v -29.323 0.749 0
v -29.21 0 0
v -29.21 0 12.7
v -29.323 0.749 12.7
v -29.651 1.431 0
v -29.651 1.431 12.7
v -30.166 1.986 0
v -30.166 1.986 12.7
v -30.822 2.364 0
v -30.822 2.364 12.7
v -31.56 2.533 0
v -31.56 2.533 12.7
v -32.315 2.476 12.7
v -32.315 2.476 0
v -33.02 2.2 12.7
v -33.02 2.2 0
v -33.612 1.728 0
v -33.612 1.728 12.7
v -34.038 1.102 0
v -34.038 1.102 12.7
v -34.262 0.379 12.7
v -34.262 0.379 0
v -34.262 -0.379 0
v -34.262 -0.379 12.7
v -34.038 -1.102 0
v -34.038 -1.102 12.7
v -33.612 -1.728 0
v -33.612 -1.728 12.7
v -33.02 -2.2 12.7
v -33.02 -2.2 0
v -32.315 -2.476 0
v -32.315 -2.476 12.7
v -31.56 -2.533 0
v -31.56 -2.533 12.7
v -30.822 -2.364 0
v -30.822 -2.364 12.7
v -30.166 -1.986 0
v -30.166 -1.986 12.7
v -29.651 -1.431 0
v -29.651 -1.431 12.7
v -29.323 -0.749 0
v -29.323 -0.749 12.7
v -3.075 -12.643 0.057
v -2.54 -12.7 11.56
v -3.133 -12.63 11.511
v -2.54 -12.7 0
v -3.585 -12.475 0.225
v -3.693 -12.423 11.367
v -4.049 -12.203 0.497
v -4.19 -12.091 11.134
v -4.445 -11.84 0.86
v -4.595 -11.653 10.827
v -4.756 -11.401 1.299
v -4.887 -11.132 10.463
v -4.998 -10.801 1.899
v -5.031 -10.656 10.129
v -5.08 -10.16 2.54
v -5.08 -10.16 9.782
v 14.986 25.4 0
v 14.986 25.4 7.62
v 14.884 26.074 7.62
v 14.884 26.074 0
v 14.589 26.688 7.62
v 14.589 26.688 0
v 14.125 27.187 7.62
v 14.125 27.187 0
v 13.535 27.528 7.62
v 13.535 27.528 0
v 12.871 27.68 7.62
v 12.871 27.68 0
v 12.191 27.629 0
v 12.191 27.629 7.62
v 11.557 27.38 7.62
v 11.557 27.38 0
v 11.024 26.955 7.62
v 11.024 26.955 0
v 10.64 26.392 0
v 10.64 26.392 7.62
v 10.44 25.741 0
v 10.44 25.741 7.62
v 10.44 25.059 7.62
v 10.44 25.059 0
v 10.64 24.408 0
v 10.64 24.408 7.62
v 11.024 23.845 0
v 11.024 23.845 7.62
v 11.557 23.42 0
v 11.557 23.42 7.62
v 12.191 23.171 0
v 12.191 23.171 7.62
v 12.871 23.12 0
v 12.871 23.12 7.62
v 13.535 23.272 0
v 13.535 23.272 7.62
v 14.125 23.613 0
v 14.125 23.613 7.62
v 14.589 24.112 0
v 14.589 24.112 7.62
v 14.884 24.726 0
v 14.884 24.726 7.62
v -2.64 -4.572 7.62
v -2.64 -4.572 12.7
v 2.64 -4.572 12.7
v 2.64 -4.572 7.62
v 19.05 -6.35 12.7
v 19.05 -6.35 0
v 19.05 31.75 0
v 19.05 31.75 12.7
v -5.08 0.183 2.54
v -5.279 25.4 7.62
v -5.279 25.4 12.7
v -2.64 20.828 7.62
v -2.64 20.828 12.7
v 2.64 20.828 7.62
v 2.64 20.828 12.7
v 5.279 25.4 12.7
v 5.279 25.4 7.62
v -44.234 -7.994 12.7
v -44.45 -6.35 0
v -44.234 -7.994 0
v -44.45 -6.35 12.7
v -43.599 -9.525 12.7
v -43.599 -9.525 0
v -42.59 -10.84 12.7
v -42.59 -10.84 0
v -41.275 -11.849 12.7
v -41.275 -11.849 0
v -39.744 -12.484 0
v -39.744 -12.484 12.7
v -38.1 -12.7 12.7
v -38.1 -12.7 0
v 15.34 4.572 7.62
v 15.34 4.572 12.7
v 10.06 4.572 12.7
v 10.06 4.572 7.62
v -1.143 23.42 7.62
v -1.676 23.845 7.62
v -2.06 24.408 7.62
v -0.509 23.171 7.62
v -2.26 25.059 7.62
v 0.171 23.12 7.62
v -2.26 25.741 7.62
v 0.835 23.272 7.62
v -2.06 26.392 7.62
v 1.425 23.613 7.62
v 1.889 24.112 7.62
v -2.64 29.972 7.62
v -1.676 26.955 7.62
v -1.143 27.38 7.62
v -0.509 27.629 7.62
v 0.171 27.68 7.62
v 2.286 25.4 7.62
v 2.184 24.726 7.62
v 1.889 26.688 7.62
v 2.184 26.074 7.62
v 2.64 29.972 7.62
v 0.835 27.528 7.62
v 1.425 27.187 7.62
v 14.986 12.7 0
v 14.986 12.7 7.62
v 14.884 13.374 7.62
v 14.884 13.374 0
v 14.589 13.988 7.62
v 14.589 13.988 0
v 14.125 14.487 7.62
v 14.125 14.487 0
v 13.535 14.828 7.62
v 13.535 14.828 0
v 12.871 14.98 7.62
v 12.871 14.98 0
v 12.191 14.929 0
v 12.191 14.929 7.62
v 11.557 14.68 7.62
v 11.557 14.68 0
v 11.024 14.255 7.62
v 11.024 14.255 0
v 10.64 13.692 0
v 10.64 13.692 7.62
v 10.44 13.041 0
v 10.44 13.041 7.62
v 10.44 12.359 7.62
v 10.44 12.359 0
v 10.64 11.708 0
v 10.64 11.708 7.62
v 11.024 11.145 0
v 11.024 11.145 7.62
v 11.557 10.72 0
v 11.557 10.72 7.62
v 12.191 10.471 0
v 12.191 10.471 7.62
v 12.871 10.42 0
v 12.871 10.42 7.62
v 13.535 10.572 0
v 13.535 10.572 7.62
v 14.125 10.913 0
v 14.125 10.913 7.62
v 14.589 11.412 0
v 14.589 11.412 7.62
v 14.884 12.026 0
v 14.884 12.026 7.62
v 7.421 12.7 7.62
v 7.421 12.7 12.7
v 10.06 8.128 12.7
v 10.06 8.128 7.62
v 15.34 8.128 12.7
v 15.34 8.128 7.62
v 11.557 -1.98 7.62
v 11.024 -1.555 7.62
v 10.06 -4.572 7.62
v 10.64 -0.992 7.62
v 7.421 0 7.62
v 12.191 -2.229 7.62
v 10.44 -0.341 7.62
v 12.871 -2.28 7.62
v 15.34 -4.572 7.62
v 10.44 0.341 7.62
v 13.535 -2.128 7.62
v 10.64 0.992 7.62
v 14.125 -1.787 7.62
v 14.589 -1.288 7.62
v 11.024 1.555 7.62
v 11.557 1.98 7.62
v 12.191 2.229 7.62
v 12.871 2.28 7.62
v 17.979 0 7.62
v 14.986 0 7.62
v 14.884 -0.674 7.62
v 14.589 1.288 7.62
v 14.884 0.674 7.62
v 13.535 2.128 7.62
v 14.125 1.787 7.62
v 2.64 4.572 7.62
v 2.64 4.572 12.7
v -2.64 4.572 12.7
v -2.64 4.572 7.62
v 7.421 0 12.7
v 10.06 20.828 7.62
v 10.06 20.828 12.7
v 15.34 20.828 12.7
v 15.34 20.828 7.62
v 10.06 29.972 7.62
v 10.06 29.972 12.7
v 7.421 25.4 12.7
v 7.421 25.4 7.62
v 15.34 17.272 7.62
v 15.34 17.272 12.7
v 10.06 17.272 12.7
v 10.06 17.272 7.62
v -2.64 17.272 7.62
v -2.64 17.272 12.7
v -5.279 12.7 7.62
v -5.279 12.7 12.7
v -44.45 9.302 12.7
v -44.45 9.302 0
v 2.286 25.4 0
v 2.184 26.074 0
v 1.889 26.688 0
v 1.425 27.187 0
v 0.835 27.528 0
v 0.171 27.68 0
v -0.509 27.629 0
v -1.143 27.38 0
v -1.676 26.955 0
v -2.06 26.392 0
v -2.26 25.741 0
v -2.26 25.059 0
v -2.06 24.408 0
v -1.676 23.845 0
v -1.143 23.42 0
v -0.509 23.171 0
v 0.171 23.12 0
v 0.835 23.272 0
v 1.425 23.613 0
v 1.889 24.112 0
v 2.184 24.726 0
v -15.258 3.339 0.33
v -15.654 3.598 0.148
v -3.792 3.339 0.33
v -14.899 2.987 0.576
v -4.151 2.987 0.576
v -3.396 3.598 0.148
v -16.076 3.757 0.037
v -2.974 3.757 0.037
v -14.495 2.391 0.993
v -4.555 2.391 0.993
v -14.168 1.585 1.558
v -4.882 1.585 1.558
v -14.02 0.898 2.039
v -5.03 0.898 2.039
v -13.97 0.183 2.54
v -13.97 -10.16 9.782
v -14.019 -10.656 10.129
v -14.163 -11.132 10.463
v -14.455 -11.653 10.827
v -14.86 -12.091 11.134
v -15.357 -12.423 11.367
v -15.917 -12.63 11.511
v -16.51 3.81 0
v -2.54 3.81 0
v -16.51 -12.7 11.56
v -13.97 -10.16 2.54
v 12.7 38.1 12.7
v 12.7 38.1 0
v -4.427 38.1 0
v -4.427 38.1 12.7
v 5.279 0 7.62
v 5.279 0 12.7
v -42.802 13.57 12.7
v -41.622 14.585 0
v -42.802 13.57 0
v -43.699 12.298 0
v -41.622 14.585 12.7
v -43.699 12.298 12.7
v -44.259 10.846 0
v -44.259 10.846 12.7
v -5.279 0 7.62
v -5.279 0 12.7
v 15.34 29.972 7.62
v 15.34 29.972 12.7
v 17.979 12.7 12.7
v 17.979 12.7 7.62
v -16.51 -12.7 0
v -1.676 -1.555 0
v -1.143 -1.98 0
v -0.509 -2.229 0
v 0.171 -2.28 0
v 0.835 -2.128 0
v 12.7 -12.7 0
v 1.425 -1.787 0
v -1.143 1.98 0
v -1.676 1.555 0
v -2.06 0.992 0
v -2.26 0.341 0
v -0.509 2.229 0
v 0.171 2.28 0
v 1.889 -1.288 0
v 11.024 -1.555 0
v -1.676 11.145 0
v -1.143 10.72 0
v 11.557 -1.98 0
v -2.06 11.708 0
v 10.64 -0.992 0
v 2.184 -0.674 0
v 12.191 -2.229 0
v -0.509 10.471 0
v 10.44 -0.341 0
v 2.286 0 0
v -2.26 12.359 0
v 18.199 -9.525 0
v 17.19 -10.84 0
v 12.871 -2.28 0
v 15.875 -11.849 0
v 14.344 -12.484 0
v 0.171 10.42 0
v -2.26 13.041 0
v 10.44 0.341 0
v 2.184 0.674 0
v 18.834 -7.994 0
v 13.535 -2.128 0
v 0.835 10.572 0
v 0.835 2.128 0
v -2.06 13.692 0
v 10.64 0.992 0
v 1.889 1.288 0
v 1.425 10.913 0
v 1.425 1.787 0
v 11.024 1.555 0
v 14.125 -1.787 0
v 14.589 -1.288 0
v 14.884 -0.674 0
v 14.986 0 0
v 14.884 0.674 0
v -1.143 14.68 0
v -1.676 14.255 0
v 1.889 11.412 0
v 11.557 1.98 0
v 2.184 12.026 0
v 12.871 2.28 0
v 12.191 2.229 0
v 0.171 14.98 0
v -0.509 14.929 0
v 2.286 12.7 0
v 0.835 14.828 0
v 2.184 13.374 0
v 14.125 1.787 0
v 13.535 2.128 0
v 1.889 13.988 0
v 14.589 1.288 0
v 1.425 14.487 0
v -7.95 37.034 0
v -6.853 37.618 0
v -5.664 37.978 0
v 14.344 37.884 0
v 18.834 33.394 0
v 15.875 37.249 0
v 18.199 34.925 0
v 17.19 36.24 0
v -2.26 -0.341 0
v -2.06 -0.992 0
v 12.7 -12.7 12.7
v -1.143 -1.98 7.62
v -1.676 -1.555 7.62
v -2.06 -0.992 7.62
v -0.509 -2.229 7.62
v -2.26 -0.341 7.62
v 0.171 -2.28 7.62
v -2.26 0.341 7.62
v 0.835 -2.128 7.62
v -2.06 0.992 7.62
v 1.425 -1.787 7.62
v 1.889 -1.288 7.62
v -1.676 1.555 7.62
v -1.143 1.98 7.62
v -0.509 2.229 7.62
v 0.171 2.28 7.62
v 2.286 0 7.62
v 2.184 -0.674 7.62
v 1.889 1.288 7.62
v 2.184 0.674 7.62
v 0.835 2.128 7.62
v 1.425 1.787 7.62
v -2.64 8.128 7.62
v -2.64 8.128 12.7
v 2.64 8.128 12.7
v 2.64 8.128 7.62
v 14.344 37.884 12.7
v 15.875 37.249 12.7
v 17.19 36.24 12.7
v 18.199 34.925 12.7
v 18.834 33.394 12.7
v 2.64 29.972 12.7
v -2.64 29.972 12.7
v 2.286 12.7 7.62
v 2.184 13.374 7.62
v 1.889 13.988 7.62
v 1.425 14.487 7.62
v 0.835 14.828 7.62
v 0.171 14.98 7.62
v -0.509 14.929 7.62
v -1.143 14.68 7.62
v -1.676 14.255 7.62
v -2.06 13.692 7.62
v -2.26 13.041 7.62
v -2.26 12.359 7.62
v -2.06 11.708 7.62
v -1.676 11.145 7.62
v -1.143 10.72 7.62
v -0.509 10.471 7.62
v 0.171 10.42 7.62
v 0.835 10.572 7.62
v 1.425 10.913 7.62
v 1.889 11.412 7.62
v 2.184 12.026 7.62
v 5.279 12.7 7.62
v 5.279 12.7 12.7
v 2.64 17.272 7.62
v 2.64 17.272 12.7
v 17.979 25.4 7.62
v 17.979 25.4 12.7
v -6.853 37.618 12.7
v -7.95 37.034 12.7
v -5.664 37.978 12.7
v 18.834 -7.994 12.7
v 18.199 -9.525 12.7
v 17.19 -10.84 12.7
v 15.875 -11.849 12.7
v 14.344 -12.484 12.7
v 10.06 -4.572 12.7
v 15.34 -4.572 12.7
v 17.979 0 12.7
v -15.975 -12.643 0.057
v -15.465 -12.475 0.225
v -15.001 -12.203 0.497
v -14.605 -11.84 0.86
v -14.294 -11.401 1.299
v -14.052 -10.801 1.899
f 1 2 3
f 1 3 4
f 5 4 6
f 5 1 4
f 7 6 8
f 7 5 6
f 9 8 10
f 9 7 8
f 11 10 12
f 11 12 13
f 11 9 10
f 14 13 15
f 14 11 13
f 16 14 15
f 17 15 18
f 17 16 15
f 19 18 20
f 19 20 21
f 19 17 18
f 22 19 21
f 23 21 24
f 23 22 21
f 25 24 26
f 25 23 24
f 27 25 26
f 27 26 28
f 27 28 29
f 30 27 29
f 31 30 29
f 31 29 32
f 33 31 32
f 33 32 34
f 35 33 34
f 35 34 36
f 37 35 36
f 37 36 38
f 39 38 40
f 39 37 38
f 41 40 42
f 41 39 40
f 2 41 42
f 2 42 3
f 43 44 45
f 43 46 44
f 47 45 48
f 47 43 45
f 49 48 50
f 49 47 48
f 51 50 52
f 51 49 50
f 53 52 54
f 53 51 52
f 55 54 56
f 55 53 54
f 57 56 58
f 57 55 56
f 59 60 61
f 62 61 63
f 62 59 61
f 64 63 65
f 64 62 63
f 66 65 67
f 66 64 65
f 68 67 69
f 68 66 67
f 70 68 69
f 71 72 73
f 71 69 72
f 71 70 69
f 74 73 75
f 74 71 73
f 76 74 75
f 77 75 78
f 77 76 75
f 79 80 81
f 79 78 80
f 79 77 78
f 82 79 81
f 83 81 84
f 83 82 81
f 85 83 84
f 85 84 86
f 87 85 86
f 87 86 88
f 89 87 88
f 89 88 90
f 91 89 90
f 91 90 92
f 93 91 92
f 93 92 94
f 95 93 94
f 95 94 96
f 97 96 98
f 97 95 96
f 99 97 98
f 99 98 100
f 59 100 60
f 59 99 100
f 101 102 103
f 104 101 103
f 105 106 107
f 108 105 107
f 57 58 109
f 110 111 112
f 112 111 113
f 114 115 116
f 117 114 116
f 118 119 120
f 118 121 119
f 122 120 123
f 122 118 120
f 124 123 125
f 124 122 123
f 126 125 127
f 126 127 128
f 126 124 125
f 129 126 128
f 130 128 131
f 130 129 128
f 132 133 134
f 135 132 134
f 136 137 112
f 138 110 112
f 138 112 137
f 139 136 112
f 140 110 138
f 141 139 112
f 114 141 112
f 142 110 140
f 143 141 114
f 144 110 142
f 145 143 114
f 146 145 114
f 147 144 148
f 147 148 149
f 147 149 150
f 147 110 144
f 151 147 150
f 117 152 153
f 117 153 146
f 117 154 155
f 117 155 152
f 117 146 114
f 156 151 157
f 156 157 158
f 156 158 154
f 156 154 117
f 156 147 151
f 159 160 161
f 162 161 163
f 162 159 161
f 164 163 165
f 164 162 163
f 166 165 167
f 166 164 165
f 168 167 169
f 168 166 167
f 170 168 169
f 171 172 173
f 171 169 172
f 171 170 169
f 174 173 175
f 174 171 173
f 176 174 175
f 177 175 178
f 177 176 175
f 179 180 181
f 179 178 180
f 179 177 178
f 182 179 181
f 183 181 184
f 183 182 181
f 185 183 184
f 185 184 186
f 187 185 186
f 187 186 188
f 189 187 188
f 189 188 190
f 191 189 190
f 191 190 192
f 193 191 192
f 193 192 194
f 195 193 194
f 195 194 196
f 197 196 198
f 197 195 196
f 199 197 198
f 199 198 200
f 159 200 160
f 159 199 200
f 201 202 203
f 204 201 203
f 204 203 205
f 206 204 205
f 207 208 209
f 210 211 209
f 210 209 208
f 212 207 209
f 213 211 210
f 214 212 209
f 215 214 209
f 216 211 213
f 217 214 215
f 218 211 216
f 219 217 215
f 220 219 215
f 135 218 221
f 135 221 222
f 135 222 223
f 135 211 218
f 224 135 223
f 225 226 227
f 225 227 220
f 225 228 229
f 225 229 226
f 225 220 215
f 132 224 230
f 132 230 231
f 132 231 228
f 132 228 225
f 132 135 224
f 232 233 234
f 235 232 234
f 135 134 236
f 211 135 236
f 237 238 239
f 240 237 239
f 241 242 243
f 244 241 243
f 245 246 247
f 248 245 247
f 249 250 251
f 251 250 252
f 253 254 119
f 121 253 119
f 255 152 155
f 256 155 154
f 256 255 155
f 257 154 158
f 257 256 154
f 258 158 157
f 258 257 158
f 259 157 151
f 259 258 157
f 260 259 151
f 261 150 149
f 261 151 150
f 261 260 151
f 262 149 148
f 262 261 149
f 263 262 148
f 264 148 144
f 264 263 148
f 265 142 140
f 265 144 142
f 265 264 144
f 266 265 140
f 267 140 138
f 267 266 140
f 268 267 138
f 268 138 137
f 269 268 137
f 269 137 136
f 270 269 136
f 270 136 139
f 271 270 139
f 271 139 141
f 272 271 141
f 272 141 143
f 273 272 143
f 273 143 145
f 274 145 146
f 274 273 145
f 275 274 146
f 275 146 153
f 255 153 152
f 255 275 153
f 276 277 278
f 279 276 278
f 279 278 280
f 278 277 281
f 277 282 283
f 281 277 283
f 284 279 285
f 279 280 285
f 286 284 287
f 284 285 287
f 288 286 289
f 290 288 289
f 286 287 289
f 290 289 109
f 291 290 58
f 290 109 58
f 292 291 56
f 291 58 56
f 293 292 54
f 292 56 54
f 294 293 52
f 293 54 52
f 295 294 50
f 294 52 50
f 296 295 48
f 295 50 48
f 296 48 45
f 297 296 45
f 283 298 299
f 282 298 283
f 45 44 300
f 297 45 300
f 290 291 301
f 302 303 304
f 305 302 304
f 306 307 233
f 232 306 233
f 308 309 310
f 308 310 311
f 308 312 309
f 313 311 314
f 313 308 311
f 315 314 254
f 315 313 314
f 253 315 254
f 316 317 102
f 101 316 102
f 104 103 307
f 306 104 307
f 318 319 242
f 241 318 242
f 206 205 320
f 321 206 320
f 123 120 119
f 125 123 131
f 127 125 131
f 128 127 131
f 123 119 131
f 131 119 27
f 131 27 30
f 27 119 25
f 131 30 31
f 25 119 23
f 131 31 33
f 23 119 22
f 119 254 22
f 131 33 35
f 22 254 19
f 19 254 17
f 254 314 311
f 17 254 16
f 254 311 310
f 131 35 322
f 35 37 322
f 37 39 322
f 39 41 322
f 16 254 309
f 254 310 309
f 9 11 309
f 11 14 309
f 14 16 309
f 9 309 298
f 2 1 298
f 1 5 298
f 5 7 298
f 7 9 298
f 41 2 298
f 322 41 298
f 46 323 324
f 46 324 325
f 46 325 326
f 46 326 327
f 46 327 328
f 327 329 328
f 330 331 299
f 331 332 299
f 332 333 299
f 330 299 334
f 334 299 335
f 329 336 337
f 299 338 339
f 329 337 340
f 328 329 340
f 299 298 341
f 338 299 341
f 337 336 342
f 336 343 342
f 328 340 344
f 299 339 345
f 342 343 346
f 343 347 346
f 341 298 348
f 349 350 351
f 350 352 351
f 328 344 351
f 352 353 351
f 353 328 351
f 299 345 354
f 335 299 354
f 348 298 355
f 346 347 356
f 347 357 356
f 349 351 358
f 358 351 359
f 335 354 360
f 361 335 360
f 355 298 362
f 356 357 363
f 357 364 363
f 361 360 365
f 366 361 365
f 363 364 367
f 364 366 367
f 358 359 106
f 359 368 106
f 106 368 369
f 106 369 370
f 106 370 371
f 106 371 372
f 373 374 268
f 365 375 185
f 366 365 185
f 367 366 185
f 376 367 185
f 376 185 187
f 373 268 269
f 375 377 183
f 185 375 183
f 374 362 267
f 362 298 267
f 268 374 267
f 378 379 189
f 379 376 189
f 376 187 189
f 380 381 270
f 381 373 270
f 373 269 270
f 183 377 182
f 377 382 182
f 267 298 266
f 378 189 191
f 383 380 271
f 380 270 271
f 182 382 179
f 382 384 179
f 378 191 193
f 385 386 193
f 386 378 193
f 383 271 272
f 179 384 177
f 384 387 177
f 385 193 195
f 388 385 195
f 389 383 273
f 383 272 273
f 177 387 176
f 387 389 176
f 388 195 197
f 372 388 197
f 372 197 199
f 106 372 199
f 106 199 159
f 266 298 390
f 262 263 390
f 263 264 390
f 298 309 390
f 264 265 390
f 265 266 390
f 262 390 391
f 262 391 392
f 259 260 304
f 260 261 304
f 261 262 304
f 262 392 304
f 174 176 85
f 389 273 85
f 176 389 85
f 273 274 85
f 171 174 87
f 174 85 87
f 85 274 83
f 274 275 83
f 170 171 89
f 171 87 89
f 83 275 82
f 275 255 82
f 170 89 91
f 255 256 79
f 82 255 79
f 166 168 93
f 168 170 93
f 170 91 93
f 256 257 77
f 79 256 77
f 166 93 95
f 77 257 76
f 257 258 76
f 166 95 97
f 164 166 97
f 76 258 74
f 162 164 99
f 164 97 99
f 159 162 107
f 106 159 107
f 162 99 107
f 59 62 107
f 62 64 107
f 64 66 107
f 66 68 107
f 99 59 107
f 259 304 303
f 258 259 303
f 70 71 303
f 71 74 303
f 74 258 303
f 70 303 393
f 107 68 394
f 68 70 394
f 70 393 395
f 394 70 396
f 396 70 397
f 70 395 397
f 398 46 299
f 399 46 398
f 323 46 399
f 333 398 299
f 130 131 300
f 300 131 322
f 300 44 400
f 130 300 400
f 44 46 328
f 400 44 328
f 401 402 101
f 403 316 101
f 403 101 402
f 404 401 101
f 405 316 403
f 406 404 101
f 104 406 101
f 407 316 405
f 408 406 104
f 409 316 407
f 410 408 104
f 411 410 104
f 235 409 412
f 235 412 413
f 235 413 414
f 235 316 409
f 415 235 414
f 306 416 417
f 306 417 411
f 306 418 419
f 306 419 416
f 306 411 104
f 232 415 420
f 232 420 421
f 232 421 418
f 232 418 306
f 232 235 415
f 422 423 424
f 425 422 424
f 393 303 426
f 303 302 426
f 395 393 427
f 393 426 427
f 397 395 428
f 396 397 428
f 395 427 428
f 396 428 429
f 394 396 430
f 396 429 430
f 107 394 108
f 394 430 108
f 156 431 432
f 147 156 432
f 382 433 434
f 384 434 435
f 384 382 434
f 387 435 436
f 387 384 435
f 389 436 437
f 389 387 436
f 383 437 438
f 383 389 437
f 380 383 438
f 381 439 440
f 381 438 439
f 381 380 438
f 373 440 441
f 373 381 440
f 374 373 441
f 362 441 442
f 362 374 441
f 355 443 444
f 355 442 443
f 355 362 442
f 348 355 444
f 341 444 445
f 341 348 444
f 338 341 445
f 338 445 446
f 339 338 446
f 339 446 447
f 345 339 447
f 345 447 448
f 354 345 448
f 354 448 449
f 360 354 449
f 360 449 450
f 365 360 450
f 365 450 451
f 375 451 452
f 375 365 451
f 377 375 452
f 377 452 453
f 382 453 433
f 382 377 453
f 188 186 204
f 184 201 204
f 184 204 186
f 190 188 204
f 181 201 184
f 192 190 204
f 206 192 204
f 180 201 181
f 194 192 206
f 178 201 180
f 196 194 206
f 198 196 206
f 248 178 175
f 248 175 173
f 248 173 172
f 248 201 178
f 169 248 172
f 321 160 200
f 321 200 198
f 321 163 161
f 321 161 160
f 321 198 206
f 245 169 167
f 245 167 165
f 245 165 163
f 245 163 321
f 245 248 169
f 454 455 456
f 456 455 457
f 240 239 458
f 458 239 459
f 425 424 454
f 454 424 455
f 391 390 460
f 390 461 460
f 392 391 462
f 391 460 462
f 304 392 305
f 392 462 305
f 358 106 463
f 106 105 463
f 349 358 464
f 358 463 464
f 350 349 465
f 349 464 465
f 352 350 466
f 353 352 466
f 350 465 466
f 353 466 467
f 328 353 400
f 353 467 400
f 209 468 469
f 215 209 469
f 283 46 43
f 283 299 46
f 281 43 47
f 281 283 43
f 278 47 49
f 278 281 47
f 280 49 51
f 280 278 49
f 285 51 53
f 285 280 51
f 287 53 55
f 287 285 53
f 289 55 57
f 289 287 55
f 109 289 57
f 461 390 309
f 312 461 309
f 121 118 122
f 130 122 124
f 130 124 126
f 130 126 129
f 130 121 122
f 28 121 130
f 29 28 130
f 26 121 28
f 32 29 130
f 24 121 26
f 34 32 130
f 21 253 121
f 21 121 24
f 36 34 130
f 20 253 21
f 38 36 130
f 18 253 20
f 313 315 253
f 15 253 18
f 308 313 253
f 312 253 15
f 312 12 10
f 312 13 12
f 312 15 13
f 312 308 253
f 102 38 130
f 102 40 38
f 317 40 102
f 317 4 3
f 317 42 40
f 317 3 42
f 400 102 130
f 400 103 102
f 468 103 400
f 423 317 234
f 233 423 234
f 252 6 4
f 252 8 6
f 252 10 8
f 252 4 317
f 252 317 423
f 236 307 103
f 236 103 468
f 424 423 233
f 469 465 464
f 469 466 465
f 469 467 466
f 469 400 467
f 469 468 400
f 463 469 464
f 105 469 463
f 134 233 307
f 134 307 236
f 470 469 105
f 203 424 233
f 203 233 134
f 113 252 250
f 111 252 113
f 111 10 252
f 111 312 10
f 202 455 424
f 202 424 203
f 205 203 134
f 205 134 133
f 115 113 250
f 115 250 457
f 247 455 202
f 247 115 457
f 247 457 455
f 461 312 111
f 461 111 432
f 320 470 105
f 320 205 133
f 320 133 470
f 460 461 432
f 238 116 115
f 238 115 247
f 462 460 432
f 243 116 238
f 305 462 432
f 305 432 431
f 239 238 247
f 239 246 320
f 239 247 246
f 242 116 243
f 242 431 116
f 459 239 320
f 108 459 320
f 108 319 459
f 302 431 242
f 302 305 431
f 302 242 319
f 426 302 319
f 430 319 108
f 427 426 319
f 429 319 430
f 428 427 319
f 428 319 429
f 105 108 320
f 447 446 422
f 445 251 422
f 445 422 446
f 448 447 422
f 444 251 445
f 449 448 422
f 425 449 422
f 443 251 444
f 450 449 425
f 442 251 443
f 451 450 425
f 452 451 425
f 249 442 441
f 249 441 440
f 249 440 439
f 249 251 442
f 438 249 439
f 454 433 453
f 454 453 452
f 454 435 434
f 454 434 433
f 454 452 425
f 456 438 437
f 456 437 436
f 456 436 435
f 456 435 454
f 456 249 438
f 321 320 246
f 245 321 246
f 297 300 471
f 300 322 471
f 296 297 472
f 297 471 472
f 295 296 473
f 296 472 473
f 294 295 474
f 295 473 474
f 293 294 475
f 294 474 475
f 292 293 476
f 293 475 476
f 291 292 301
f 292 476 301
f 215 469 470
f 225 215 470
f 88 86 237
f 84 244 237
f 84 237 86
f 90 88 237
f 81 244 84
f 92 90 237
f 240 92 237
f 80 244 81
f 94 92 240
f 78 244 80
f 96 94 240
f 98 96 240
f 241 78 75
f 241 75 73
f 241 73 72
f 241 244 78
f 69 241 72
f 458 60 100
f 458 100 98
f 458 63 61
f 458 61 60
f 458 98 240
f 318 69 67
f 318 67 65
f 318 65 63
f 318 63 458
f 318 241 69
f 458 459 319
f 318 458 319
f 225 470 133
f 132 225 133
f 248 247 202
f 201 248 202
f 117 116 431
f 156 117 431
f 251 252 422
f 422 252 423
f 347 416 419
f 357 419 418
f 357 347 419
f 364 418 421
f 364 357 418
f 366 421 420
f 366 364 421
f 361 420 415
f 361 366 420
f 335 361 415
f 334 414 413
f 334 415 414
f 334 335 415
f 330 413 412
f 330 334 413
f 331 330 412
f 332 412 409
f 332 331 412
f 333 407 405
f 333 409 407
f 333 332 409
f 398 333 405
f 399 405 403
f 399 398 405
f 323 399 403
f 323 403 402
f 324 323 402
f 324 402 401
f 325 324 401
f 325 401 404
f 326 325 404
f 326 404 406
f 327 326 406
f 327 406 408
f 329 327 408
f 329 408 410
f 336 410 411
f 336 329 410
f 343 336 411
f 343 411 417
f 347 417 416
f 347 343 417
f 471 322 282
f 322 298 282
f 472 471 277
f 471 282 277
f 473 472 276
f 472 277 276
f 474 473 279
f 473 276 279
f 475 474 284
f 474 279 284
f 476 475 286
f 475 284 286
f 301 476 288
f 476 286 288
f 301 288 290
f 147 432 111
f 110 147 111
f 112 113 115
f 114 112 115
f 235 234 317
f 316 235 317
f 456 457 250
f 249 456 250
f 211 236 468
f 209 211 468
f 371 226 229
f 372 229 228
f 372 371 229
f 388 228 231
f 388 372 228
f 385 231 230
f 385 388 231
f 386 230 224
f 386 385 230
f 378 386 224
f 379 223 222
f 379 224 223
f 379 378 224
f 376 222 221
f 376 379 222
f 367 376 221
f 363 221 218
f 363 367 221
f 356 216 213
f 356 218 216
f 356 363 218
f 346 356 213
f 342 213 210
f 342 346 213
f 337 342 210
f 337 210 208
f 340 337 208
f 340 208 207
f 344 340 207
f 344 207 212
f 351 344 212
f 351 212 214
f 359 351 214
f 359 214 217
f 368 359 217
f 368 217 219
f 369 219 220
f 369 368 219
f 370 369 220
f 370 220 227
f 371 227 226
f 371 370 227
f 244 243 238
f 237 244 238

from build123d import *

# Parameters (mm, degrees)
SKETCH1_R           = 2.286
SKETCH1_R_2         = 2.54
BOSS_EXTRUDE1_DEPTH = 12.7
FILLET1_R           = 6.35
CUT_EXTRUDE1_DEPTH  = 8.89
FILLET2_R           = 2.54
CUT_EXTRUDE2_DEPTH  = 5.08


with BuildPart() as part:
    # Sketch1 → Boss-Extrude1 (new body)
    with BuildSketch(Plane.XY):
        Polygon((-6.35, 38.1), (-44.45, 12.7), (-44.45, -12.7), (-6.35, -12.7), (19.05, -12.7), (19.05, 38.1), align=None)
        Circle(SKETCH1_R, mode=Mode.SUBTRACT)
        with Locations((-31.75, 0)):
            Circle(SKETCH1_R_2, mode=Mode.SUBTRACT)
        with Locations((12.7, 0)):
            Circle(SKETCH1_R, mode=Mode.SUBTRACT)
        with Locations((12.7, 12.7)):
            Circle(SKETCH1_R, mode=Mode.SUBTRACT)
        with Locations((12.7, 25.4)):
            Circle(SKETCH1_R, mode=Mode.SUBTRACT)
        with Locations((0, 12.7)):
            Circle(SKETCH1_R, mode=Mode.SUBTRACT)
        with Locations((0, 25.4)):
            Circle(SKETCH1_R, mode=Mode.SUBTRACT)
    extrude(amount=BOSS_EXTRUDE1_DEPTH)

    # Fillet1
    fillet1_edges = [part.edges().sort_by_distance(p)[0] for p in [
        (-44.45, -12.7, 6.35),
        (-44.45, 12.7, 6.35),
        (-6.35, 38.1, 6.35),
        (19.05, 38.1, 6.35),
        (19.05, -12.7, 6.35),
    ]]
    fillet(fillet1_edges, radius=FILLET1_R)

    # Sketch2 → Cut-Extrude1 (cut)
    with BuildSketch(Plane(origin=(-5.08, 0, 0), x_dir=(0, 0, -1), z_dir=(1, 0, 0))):
        Polygon((0, 3.81), (-11.560426456, -12.7), (0, -12.7), align=None)
    extrude(amount=-CUT_EXTRUDE1_DEPTH, mode=Mode.SUBTRACT)

    # Fillet2
    fillet2_edges = [part.edges().sort_by_distance(p)[0] for p in [
        (-13.97, -4.445, 0),
        (-13.97, -12.7, 5.780213228),
        (-5.08, -4.445, 0),
        (-5.08, -12.7, 5.780213228),
    ]]
    fillet(fillet2_edges, radius=FILLET2_R)

    # Sketch3 → Cut-Extrude2 (cut)
    with BuildSketch(Plane.XY.offset(12.7)):
        Polygon((17.979290861, 0), (15.339645431, 4.572), (10.060354569, 4.572), (7.420709139, 0), (10.060354569, -4.572), (15.339645431, -4.572), align=None)
        Polygon((5.279290861, 0), (2.639645431, 4.572), (-2.639645431, 4.572), (-5.279290861, 0), (-2.639645431, -4.572), (2.639645431, -4.572), align=None)
        Polygon((17.979290861, 12.7), (15.339645431, 17.272), (10.060354569, 17.272), (7.420709139, 12.7), (10.060354569, 8.128), (15.339645431, 8.128), align=None)
        Polygon((17.979290861, 25.4), (15.339645431, 29.972), (10.060354569, 29.972), (7.420709139, 25.4), (10.060354569, 20.828), (15.339645431, 20.828), align=None)
        Polygon((5.279290861, 12.7), (2.639645431, 17.272), (-2.639645431, 17.272), (-5.279290861, 12.7), (-2.639645431, 8.128), (2.639645431, 8.128), align=None)
        Polygon((5.279290861, 25.4), (2.639645431, 29.972), (-2.639645431, 29.972), (-5.279290861, 25.4), (-2.639645431, 20.828), (2.639645431, 20.828), align=None)
    extrude(amount=-CUT_EXTRUDE2_DEPTH, mode=Mode.SUBTRACT)


solid = part.part
